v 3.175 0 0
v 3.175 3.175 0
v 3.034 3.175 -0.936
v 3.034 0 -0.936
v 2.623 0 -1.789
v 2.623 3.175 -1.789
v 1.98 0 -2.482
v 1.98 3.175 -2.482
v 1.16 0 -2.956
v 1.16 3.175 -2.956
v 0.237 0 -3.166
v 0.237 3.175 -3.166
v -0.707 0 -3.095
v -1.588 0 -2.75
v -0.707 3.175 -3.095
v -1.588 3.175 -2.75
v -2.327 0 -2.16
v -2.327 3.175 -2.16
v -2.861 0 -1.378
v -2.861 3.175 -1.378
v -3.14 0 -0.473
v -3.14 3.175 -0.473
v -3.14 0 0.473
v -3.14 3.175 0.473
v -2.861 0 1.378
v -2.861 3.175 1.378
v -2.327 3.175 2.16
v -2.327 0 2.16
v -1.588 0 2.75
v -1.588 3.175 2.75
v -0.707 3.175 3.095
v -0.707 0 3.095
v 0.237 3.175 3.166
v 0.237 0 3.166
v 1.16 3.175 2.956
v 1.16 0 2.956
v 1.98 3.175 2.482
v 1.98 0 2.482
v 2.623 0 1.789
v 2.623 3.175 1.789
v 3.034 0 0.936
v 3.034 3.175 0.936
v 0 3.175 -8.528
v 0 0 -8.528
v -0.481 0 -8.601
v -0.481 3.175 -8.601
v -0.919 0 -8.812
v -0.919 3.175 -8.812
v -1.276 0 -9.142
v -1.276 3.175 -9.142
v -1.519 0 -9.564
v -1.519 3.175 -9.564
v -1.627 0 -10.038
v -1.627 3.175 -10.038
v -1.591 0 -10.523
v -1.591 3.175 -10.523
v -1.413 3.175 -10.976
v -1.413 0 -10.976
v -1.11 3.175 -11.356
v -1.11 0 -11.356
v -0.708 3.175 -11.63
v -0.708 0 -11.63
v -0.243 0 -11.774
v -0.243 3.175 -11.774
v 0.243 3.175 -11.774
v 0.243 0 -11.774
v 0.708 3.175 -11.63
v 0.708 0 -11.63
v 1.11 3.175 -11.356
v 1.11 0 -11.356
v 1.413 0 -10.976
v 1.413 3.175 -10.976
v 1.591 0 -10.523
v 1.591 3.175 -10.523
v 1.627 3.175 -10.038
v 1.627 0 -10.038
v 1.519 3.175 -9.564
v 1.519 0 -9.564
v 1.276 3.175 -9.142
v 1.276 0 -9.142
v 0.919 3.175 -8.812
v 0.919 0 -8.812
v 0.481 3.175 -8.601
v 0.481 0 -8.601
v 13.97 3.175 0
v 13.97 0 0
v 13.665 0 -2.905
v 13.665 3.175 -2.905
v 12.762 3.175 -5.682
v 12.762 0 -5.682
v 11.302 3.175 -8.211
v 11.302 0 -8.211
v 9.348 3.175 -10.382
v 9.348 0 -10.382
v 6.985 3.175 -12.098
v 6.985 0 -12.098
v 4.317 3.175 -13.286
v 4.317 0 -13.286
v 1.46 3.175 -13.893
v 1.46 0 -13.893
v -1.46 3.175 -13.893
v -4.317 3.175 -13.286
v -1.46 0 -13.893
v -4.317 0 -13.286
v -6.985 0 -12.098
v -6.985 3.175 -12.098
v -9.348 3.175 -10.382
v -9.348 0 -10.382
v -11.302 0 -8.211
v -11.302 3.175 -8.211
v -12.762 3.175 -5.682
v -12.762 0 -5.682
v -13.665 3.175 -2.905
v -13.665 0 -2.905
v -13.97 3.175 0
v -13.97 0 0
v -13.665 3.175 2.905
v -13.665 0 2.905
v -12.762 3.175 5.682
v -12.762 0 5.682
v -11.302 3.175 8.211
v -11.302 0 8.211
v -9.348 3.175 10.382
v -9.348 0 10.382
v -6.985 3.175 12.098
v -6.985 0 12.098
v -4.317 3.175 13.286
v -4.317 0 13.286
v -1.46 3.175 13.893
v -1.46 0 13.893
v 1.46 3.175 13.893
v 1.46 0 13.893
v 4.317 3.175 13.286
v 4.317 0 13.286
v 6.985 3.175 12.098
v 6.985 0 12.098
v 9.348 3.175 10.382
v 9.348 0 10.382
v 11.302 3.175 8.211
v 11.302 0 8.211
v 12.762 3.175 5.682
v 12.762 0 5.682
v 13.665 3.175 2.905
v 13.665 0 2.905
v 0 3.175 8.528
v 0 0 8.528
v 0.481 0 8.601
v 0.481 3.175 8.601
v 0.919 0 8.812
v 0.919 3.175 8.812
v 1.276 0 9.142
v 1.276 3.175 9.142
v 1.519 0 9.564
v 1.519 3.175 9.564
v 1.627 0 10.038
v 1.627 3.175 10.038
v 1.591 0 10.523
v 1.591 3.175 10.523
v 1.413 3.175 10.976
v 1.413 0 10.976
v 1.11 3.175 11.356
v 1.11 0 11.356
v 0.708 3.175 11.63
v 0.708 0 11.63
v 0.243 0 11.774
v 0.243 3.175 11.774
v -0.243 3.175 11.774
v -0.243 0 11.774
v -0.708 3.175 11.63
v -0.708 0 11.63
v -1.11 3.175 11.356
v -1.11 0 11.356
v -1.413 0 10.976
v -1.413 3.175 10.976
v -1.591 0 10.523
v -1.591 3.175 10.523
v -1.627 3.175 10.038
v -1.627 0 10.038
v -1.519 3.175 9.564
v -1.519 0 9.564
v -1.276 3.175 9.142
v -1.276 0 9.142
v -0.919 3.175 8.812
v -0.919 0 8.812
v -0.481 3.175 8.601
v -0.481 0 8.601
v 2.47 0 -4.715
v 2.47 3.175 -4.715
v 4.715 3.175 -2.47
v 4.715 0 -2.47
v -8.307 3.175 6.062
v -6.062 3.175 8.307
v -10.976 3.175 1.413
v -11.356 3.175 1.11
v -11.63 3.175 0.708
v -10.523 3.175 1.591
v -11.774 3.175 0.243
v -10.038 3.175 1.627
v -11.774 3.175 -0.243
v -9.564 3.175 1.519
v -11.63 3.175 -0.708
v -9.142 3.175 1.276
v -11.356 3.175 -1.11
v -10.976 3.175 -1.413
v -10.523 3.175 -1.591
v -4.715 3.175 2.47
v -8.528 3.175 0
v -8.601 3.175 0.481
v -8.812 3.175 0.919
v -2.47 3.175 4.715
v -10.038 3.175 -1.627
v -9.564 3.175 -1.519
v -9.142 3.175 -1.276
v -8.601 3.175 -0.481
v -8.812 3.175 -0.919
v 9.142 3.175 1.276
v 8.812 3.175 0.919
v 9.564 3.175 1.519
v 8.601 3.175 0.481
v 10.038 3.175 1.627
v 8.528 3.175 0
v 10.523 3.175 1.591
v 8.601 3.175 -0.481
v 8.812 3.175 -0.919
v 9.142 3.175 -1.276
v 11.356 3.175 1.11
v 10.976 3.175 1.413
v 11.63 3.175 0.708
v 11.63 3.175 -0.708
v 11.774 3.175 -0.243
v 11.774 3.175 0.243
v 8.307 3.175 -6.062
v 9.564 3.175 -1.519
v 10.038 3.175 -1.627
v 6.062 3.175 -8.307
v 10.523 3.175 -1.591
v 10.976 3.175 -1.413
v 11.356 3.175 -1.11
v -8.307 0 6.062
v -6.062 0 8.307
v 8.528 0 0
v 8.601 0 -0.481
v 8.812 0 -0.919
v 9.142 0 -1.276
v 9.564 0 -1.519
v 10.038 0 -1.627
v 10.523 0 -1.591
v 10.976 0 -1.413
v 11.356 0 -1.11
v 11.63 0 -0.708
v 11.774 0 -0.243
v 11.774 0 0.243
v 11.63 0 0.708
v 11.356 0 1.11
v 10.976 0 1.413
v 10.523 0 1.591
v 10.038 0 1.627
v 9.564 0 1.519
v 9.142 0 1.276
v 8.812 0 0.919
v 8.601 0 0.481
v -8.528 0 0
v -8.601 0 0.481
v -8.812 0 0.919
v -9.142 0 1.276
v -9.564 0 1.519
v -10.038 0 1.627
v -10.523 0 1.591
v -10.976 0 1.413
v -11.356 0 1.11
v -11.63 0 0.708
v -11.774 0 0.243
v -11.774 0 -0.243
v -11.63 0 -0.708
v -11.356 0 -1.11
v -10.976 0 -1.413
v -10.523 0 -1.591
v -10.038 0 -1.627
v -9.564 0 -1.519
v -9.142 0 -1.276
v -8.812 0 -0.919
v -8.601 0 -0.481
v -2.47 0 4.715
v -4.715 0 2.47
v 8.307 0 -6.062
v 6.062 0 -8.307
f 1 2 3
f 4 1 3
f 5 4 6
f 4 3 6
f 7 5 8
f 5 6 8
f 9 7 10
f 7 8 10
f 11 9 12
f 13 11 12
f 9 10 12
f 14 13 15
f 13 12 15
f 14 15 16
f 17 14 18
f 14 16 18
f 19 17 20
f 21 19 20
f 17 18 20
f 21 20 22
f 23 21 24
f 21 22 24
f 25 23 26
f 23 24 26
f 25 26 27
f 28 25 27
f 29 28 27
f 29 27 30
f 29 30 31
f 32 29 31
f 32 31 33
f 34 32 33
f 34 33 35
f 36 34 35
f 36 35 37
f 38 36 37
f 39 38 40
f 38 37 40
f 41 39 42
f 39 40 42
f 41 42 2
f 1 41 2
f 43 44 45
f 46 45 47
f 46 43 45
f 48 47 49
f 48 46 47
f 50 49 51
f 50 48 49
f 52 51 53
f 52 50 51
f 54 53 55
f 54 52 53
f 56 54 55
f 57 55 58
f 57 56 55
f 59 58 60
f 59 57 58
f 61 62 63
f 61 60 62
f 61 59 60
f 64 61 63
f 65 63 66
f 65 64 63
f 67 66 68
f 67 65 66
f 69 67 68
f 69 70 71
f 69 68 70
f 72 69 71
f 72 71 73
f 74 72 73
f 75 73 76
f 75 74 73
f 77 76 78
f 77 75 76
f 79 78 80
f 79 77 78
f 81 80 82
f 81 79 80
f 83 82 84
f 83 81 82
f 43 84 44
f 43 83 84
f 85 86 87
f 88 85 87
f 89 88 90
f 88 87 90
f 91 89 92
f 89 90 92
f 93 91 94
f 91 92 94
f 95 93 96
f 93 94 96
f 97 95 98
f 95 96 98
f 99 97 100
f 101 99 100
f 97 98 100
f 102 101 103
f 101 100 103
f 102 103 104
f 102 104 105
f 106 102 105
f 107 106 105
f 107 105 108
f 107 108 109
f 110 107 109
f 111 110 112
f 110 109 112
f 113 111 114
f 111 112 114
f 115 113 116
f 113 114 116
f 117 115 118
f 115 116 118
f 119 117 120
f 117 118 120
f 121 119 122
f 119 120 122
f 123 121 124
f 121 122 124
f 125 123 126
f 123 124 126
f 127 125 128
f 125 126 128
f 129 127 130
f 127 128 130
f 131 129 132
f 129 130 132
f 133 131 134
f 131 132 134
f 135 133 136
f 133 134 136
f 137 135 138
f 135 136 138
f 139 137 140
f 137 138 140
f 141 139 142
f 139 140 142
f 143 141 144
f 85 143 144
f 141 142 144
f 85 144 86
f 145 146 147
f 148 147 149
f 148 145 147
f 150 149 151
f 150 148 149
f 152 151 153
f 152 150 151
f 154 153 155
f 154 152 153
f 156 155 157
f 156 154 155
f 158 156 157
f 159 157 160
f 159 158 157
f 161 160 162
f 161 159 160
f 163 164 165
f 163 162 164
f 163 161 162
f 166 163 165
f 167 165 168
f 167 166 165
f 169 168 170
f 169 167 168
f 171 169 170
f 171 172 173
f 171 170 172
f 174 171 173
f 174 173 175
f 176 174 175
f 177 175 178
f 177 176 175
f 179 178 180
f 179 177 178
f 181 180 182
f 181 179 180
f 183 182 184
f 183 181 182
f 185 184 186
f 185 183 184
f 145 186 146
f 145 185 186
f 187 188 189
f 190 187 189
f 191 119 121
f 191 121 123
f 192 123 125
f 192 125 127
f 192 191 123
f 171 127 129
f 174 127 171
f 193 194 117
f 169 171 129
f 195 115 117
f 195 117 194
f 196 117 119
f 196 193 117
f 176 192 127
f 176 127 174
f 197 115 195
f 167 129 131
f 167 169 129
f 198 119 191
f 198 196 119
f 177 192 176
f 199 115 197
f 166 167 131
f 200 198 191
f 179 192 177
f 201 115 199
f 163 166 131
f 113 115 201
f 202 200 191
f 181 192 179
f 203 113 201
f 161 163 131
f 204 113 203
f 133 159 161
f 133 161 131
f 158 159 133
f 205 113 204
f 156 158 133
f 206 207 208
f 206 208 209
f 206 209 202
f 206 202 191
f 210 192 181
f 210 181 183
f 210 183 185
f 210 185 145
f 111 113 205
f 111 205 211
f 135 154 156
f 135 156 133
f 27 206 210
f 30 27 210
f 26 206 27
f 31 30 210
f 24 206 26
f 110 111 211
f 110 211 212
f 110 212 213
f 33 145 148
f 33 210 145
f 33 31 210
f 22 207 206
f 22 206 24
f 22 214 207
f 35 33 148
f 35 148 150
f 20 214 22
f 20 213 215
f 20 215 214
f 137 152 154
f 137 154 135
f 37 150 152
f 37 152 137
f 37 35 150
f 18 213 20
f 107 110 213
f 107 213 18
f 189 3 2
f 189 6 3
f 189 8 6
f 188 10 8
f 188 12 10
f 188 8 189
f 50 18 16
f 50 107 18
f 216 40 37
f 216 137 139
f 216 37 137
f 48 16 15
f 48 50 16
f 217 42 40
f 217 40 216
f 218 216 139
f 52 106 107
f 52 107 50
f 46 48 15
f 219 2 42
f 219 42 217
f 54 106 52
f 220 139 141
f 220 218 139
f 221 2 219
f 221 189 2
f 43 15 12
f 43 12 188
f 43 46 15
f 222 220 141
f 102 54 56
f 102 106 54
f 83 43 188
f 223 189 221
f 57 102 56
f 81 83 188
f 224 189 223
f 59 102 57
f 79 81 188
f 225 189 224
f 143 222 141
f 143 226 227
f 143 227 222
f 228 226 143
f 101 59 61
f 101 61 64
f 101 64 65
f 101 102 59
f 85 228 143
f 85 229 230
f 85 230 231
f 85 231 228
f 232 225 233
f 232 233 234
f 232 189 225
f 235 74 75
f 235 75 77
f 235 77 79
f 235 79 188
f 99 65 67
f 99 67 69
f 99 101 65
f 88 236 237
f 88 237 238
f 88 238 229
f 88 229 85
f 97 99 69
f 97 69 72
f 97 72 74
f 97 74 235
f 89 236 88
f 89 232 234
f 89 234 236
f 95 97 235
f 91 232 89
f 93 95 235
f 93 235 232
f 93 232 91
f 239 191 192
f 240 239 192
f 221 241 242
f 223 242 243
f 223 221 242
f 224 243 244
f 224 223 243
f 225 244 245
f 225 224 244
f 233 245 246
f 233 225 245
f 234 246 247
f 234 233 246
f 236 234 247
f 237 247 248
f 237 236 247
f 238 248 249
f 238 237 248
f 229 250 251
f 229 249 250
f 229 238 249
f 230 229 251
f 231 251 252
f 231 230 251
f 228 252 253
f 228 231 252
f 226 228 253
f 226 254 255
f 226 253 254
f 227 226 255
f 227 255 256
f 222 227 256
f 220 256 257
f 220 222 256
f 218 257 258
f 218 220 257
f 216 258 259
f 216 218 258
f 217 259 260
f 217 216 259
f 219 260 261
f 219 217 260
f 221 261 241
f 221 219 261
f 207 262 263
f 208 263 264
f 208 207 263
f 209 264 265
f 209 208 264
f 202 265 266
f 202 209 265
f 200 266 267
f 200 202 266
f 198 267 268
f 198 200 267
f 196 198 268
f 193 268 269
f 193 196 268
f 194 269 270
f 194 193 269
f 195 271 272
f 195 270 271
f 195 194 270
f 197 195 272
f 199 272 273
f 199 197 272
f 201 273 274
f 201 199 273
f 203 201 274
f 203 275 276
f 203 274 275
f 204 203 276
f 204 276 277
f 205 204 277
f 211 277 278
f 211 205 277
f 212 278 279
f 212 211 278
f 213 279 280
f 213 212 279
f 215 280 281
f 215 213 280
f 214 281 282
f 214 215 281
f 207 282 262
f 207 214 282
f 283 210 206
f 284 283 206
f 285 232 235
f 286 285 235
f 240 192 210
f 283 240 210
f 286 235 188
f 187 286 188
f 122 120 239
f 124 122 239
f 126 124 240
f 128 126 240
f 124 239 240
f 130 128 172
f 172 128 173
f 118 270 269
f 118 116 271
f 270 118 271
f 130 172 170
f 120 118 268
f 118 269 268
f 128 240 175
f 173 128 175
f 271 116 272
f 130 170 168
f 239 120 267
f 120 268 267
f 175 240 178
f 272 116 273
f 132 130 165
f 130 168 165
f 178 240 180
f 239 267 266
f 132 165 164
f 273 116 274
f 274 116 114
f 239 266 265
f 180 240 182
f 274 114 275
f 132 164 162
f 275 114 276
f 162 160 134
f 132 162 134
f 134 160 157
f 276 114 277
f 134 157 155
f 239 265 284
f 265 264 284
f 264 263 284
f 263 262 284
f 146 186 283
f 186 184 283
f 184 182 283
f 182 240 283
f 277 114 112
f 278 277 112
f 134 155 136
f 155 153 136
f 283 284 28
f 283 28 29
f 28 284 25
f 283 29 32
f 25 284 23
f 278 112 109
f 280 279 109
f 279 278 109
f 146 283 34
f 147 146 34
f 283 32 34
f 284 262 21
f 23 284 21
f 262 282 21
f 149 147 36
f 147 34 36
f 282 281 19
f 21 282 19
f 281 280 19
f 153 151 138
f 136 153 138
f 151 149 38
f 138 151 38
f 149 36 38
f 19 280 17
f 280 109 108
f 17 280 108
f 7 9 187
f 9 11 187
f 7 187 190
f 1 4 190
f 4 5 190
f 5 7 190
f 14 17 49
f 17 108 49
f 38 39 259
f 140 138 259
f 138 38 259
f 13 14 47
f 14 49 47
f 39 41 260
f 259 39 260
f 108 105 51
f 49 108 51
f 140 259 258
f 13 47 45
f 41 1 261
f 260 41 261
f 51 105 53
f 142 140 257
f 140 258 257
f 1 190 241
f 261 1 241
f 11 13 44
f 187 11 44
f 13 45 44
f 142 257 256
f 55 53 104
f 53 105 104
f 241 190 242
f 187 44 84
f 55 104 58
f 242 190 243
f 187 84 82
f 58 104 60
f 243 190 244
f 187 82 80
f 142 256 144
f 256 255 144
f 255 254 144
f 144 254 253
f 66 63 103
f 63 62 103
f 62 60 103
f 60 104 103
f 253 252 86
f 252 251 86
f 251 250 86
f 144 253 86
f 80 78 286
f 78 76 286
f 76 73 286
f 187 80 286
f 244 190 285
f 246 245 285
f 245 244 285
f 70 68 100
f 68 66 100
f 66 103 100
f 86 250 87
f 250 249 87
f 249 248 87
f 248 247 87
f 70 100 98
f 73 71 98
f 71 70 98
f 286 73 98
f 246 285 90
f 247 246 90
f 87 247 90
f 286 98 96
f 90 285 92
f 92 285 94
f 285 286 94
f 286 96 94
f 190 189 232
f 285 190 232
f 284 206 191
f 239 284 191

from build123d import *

# Parameters (mm, degrees)
SKETCH1_R           = 13.97
BOSS_EXTRUDE1_DEPTH = 3.175
SKETCH2_R           = 3.175
CUT_EXTRUDE1_DEPTH  = 3.175
CIRPATTERN1_COUNT   = 4
CUT_EXTRUDE2_DEPTH  = 5.08
CIRPATTERN2_COUNT   = 2


with BuildPart() as part:
    # Sketch1 → Boss-Extrude1 (new body)
    with BuildSketch(Plane(origin=(0, 0, 0), x_dir=(1, 0, 0), z_dir=(0, 1, 0))):
        Circle(SKETCH1_R)
    extrude(amount=BOSS_EXTRUDE1_DEPTH)

    # Sketch2 → Cut-Extrude1 (cut)
    with BuildSketch(Plane(origin=(0, 3.175, 0), x_dir=(1, 0, 0), z_dir=(0, 1, 0))):
        Circle(SKETCH2_R)
    extrude(amount=-CUT_EXTRUDE1_DEPTH, mode=Mode.SUBTRACT)

    # Sketch4 → #4 Clearance Hole1 (revolve, cut)
    with BuildSketch(Plane(origin=(0, 3.175, -10.16), x_dir=(0, 0, 1), z_dir=(1, 0, 0))):
        Polygon((0, 0), (0, 11.140574487), (1.63195, 10.16), (1.63195, 0), align=None)
    f_4_clearance_hole1 = revolve(axis=Axis((0, 9.525, -10.16), (0, -1, 0)), mode=Mode.SUBTRACT)

    # CirPattern1: #4 Clearance Hole1 ×4 about axis
    cirpattern1_axis = Axis((0, 0, 0), (0, 1, 0))
    for i in range(1, CIRPATTERN1_COUNT):
        add(f_4_clearance_hole1.rotate(cirpattern1_axis, i * 360 / CIRPATTERN1_COUNT), mode=Mode.SUBTRACT)

    # Sketch6 → Cut-Extrude2 (cut)
    with BuildSketch(Plane(origin=(0, 3.175, 0), x_dir=(1, 0, 0), z_dir=(0, 1, 0))):
        Polygon((4.714634464, 2.469570433), (8.306736912, 6.061672882), (6.061672882, 8.306736912), (2.469570433, 4.714634464), align=None)
    cut_extrude2 = extrude(amount=-CUT_EXTRUDE2_DEPTH, mode=Mode.SUBTRACT)

    # CirPattern2: Cut-Extrude2 ×2 about axis
    cirpattern2_axis = Axis((0, 0, 0), (0, 1, 0))
    for i in range(1, CIRPATTERN2_COUNT):
        add(cut_extrude2.rotate(cirpattern2_axis, i * 360 / CIRPATTERN2_COUNT), mode=Mode.SUBTRACT)


solid = part.part
